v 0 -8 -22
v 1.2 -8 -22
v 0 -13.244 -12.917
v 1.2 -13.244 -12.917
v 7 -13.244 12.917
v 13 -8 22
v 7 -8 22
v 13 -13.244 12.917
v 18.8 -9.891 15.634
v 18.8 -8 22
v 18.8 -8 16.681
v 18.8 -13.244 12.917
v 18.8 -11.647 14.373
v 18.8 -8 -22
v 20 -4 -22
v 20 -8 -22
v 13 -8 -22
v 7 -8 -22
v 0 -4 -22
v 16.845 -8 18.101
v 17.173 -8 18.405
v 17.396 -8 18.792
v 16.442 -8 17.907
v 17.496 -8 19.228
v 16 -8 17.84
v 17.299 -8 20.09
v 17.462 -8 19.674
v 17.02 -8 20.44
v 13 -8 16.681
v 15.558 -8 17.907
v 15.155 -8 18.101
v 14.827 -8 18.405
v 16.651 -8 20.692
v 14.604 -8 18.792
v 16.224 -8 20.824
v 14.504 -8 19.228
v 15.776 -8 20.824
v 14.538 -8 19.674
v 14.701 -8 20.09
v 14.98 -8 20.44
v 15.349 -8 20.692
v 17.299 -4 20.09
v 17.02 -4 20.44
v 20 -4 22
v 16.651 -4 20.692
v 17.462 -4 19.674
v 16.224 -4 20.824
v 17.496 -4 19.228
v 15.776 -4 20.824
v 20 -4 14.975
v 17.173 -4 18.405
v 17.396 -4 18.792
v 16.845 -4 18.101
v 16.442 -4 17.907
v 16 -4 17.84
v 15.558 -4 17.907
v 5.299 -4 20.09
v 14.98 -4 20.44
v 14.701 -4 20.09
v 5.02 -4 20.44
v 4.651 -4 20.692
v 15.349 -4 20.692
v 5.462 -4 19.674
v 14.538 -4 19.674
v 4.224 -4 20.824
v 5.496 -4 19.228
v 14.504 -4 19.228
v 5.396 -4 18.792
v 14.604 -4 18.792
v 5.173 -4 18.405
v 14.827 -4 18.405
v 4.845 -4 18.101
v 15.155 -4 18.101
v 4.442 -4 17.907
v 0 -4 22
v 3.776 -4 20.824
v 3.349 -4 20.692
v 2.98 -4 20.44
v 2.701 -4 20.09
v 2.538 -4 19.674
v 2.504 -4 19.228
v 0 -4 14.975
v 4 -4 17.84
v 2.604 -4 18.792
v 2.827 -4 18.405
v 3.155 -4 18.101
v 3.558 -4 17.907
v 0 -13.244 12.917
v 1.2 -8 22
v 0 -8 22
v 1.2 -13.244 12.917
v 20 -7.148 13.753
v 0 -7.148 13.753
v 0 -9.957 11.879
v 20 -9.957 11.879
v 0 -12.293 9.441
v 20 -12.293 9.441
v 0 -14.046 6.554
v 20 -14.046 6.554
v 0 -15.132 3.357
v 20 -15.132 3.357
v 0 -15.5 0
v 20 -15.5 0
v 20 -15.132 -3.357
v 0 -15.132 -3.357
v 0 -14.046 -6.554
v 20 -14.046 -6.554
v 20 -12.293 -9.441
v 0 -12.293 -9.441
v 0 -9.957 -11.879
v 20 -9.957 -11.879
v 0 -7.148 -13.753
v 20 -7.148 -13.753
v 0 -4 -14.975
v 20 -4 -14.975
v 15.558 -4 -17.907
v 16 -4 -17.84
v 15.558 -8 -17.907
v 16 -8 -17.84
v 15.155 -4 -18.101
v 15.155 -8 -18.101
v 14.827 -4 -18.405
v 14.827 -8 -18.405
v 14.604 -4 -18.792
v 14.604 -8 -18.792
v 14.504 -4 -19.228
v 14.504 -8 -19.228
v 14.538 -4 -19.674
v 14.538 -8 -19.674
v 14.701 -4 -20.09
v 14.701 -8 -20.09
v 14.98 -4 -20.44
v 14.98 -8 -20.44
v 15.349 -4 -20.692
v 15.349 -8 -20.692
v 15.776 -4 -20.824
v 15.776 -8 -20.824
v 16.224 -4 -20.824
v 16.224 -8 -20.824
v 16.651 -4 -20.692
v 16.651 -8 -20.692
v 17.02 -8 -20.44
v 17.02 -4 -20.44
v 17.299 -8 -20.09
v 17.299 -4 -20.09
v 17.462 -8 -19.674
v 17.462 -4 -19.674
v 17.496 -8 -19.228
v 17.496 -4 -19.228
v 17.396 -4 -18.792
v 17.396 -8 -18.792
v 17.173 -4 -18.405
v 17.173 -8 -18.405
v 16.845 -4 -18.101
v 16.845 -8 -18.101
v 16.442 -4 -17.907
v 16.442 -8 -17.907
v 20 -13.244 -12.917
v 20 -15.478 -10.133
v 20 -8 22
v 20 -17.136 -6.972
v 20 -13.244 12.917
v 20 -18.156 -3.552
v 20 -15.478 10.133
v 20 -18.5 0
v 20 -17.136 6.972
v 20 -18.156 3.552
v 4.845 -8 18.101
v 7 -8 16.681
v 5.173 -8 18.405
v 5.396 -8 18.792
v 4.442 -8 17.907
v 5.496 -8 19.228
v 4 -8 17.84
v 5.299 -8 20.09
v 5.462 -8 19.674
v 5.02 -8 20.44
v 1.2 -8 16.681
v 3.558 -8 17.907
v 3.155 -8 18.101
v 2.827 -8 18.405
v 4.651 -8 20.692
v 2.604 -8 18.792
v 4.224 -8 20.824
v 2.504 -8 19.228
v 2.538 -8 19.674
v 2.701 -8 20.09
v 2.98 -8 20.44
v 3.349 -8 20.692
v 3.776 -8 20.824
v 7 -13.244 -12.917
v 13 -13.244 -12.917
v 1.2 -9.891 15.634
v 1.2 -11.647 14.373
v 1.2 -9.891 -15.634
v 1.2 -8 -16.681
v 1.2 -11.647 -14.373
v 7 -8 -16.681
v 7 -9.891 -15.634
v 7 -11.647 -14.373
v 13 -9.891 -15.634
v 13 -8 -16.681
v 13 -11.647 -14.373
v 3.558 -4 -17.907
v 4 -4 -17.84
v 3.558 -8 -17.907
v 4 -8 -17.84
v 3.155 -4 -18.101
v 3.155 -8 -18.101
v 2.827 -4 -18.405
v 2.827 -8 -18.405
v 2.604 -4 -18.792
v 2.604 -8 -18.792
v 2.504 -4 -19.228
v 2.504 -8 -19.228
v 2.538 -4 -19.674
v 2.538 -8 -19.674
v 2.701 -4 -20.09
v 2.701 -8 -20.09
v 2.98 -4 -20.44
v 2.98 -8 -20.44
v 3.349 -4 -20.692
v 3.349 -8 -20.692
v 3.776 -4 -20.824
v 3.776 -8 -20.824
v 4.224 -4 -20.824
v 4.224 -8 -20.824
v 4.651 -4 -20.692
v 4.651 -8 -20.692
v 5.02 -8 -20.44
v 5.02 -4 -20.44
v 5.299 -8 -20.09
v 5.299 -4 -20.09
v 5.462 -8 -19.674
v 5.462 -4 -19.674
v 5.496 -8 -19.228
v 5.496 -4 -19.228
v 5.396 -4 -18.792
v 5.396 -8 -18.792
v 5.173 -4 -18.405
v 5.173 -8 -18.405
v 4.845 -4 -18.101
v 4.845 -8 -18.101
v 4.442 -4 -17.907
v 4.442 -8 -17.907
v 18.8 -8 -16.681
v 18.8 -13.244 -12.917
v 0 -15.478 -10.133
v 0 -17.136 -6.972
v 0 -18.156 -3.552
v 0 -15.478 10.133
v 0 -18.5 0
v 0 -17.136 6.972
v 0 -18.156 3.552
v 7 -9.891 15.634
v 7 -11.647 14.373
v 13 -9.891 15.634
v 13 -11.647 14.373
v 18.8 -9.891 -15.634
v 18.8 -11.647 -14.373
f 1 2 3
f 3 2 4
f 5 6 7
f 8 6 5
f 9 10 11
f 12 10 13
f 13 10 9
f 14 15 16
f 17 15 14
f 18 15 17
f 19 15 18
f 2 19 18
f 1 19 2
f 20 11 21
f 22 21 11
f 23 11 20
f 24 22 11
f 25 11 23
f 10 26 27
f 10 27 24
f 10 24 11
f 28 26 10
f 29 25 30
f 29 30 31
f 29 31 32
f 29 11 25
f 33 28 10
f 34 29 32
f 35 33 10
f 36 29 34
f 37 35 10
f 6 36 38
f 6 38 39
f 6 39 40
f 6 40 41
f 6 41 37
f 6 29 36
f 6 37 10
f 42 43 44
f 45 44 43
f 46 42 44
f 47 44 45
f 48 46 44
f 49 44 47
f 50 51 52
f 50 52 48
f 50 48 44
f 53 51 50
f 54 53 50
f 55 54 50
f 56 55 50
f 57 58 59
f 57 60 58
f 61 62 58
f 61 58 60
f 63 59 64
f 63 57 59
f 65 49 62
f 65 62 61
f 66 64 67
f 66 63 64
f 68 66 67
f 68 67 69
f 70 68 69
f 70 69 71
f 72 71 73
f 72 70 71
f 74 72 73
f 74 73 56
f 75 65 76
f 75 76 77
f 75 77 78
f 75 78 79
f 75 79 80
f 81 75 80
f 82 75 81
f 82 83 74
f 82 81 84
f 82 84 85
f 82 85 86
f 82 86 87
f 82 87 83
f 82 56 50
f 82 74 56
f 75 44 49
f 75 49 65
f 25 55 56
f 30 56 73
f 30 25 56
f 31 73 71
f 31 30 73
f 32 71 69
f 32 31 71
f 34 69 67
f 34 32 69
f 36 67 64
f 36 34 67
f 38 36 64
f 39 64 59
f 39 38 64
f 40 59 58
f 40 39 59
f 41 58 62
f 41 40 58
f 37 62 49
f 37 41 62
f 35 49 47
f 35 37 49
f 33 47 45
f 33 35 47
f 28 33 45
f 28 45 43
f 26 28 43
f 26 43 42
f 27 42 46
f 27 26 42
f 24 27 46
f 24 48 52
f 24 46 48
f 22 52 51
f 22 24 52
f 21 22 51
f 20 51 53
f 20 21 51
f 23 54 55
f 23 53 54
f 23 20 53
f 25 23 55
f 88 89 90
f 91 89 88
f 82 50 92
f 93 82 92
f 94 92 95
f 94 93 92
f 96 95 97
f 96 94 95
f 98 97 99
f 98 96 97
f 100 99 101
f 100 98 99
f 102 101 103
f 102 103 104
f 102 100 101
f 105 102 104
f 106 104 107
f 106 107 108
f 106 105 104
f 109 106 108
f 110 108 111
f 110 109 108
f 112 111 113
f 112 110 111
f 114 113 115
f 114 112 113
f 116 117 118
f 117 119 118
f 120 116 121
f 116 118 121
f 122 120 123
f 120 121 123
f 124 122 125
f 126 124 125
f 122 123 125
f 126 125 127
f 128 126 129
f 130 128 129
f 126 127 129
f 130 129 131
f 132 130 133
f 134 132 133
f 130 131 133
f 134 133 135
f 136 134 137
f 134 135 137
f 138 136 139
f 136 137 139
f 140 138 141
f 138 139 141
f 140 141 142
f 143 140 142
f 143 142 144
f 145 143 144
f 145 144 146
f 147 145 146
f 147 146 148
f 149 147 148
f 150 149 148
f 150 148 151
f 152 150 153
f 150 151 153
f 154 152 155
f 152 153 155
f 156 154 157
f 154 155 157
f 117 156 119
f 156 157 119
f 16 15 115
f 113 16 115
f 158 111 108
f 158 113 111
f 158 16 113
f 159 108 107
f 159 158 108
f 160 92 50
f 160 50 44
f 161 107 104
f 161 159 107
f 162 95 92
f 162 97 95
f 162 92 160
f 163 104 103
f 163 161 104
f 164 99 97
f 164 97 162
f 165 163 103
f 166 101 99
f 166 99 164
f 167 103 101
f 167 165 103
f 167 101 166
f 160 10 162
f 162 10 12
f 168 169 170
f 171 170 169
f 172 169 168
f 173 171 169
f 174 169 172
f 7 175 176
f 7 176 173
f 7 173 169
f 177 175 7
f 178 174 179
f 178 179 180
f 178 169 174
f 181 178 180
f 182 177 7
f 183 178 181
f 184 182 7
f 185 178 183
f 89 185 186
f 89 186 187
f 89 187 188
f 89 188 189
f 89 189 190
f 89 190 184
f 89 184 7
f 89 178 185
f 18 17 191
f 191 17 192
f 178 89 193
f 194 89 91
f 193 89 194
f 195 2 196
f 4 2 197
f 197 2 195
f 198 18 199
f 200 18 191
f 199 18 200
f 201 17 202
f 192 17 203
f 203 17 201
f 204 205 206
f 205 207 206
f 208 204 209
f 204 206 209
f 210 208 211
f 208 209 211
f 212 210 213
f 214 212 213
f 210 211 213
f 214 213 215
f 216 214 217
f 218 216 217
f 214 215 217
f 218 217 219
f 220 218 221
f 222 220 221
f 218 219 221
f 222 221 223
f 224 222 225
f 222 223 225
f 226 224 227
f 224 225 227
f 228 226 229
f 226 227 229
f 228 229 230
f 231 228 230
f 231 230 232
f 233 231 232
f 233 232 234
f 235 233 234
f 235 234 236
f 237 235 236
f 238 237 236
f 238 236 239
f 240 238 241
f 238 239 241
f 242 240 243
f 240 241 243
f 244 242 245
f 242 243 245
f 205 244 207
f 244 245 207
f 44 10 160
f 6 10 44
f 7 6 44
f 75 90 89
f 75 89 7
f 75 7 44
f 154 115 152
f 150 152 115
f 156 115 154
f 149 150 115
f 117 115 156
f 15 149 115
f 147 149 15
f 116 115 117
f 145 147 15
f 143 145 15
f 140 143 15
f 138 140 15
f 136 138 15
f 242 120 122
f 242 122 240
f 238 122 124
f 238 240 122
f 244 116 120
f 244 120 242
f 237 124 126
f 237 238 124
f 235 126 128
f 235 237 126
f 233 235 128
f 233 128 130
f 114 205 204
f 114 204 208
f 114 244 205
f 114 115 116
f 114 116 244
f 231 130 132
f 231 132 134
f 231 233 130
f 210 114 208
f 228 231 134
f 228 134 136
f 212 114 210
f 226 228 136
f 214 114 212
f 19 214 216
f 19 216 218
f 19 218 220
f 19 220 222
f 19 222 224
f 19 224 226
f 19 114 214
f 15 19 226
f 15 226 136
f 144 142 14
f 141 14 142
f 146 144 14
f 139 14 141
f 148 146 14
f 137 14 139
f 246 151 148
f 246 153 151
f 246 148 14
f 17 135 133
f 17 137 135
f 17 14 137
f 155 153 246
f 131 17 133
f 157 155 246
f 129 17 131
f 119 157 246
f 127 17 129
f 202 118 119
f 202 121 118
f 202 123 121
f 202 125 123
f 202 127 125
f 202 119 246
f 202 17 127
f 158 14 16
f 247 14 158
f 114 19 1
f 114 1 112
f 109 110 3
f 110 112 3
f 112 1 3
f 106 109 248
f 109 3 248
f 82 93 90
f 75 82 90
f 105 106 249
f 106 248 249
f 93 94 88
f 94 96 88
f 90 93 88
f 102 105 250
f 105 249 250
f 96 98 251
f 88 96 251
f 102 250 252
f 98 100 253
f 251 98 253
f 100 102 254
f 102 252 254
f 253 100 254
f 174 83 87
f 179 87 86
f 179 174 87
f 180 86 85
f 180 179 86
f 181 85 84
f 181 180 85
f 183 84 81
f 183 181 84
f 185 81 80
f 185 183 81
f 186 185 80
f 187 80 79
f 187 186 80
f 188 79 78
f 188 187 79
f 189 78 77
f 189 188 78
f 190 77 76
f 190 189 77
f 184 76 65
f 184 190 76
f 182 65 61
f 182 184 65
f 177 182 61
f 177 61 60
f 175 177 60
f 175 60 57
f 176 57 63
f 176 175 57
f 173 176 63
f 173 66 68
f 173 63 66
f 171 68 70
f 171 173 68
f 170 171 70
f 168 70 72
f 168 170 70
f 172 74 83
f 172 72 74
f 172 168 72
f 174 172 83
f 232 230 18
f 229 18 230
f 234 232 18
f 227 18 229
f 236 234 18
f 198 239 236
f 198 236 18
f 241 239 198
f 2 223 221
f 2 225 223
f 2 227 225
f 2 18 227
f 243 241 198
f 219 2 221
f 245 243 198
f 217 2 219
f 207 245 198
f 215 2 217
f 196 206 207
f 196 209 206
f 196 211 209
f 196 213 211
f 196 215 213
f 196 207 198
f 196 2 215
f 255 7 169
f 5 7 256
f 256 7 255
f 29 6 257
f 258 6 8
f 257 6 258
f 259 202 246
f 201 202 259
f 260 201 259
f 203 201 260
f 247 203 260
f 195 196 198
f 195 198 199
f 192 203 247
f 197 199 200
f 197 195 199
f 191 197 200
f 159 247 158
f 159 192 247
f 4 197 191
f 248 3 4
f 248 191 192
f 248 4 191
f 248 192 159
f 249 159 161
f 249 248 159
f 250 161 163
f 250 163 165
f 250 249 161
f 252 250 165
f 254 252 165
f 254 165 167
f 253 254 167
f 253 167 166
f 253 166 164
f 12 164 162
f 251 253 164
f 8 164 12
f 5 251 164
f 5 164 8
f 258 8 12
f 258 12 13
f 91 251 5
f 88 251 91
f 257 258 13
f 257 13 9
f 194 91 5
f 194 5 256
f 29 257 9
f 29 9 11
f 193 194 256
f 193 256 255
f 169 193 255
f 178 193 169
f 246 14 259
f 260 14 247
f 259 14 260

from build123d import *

# Parameters (mm, degrees)
EXTRUDE_1_DEPTH          = 20
RIB_1_REACH              = 37.018
SKETCH_3_WALL_W          = 82.524326188
SKETCH_3_WALL_H          = 1.2
RIB_2_REACH              = 32.434
SKETCH_4_WALL_W          = 73.357332182
SKETCH_4_WALL_H          = 6
MM_1_AT_2_COUNT          = 2
MM_1_AT_2_PITCH          = 12
MIRROR_2_COPY_1_REACH    = 37.018
MIRROR_2_COPY_1_SKETCH_W = 82.524326188
MIRROR_2_COPY_1_SKETCH_H = 1.2


with BuildPart() as part:
    # 草图1 → 凸台-拉伸1 (new body)
    with BuildSketch(Plane(origin=(0, 0, 0), x_dir=(0, 0, -1), z_dir=(1, 0, 0))):
        with BuildLine():
            Line((-22, -4), (-14.974979132, -4))
            ThreePointArc((-14.974979132, -4), (0, -15.5), (14.974979132, -4))
            Line((14.974979132, -4), (22, -4))
            Line((22, -4), (22, -8))
            Line((22, -8), (16.680827318, -8))
            ThreePointArc((16.680827318, -8), (0, -18.5), (-16.680827318, -8))
            Line((-16.680827318, -8), (-22, -8))
            Line((-22, -8), (-22, -4))
        make_face()
    extrude(amount=EXTRUDE_1_DEPTH)

    # 草图3 wall → 筋1 (add, up to next)
    with BuildSketch(Plane(origin=(0, -10.622155252, 17.458293879), x_dir=(0, -0.500000000025, -0.86602540377), z_dir=(0, -0.86602540377, 0.500000000025)), mode=Mode.PRIVATE) as rib_1_sk1:
        with Locations((0, 0.6)):
            Rectangle(SKETCH_3_WALL_W, SKETCH_3_WALL_H)
    rib_1_tool1 = extrude(rib_1_sk1.sketch, amount=-RIB_1_REACH, mode=Mode.PRIVATE) - part.part
    rib_1 = rib_1_tool1.solids().sort_by_distance((0, -10.622155252, 17.458293879))[0]
    add(rib_1)

    # 草图4 wall → 筋2 (add, up to next)
    with BuildSketch(Plane(origin=(10, -10.622155252, 17.458293879), x_dir=(0, -0.500000000025, -0.86602540377), z_dir=(0, -0.86602540377, 0.500000000025)), mode=Mode.PRIVATE) as rib_2_sk1:
        Rectangle(SKETCH_4_WALL_W, SKETCH_4_WALL_H)
    rib_2_tool1 = extrude(rib_2_sk1.sketch, amount=-RIB_2_REACH, mode=Mode.PRIVATE) - part.part
    rib_2 = rib_2_tool1.solids().sort_by_distance((10, -10.622155252, 17.458293879))[0]
    add(rib_2)

    # 镜向1: 筋1 across plane
    add(rib_1.mirror(Plane.ZY.offset(-10)))

    # 草图6 → 大小mm 暗销孔1 (revolve, cut)
    with BuildSketch(Plane(origin=(16, -8, 19.340413659), x_dir=(0, 0, -1), z_dir=(1, 0, 0))):
        Polygon((0, 0), (0, 5.901290929), (1.5, 5), (1.5, 0), align=None)
    mm_1 = revolve(axis=Axis((16, -14.35, 19.340413659), (0, 1, 0)), mode=Mode.SUBTRACT)

    # 大小mm 暗销孔1 at 2: 大小mm 暗销孔1 ×2
    with Locations(*[(-i * MM_1_AT_2_PITCH, 0, 0) for i in range(1, MM_1_AT_2_COUNT)]):
        add(mm_1, mode=Mode.SUBTRACT)

    # 镜向2: 筋1, 筋2, 大小mm 暗销孔1 across plane
    add(rib_1.mirror(Plane.XY))
    add(rib_2.mirror(Plane.XY))
    add(mm_1.mirror(Plane.XY), mode=Mode.SUBTRACT)

    # 镜向2 copy 1 sketch → 镜向2 copy 1 (add, up to next)
    with BuildSketch(Plane(origin=(20, -10.622155252, -17.458293879), x_dir=(0, -0.500000000025, 0.86602540377), z_dir=(0, -0.86602540377, -0.500000000025)), mode=Mode.PRIVATE) as mirror_2_copy_1_sk1:
        with Locations((0, 0.6)):
            Rectangle(MIRROR_2_COPY_1_SKETCH_W, MIRROR_2_COPY_1_SKETCH_H)
    mirror_2_copy_1_tool1 = extrude(mirror_2_copy_1_sk1.sketch, amount=-MIRROR_2_COPY_1_REACH, mode=Mode.PRIVATE) - part.part
    add(mirror_2_copy_1_tool1.solids().sort_by_distance((20, -10.622155252, -17.458293879))[0])

    # 镜向2 copy 2 sketch → 镜向2 copy 2 (revolve, cut)
    with BuildSketch(Plane(origin=(4, -8, -19.340413659), x_dir=(0, 0, 1), z_dir=(1, 0, 0))):
        Polygon((0, 0), (0, -5.901290929), (1.5, -5), (1.5, 0), align=None)
    revolve(axis=Axis((4, -14.35, -19.340413659), (0, -1, 0)), mode=Mode.SUBTRACT)


solid = part.part
